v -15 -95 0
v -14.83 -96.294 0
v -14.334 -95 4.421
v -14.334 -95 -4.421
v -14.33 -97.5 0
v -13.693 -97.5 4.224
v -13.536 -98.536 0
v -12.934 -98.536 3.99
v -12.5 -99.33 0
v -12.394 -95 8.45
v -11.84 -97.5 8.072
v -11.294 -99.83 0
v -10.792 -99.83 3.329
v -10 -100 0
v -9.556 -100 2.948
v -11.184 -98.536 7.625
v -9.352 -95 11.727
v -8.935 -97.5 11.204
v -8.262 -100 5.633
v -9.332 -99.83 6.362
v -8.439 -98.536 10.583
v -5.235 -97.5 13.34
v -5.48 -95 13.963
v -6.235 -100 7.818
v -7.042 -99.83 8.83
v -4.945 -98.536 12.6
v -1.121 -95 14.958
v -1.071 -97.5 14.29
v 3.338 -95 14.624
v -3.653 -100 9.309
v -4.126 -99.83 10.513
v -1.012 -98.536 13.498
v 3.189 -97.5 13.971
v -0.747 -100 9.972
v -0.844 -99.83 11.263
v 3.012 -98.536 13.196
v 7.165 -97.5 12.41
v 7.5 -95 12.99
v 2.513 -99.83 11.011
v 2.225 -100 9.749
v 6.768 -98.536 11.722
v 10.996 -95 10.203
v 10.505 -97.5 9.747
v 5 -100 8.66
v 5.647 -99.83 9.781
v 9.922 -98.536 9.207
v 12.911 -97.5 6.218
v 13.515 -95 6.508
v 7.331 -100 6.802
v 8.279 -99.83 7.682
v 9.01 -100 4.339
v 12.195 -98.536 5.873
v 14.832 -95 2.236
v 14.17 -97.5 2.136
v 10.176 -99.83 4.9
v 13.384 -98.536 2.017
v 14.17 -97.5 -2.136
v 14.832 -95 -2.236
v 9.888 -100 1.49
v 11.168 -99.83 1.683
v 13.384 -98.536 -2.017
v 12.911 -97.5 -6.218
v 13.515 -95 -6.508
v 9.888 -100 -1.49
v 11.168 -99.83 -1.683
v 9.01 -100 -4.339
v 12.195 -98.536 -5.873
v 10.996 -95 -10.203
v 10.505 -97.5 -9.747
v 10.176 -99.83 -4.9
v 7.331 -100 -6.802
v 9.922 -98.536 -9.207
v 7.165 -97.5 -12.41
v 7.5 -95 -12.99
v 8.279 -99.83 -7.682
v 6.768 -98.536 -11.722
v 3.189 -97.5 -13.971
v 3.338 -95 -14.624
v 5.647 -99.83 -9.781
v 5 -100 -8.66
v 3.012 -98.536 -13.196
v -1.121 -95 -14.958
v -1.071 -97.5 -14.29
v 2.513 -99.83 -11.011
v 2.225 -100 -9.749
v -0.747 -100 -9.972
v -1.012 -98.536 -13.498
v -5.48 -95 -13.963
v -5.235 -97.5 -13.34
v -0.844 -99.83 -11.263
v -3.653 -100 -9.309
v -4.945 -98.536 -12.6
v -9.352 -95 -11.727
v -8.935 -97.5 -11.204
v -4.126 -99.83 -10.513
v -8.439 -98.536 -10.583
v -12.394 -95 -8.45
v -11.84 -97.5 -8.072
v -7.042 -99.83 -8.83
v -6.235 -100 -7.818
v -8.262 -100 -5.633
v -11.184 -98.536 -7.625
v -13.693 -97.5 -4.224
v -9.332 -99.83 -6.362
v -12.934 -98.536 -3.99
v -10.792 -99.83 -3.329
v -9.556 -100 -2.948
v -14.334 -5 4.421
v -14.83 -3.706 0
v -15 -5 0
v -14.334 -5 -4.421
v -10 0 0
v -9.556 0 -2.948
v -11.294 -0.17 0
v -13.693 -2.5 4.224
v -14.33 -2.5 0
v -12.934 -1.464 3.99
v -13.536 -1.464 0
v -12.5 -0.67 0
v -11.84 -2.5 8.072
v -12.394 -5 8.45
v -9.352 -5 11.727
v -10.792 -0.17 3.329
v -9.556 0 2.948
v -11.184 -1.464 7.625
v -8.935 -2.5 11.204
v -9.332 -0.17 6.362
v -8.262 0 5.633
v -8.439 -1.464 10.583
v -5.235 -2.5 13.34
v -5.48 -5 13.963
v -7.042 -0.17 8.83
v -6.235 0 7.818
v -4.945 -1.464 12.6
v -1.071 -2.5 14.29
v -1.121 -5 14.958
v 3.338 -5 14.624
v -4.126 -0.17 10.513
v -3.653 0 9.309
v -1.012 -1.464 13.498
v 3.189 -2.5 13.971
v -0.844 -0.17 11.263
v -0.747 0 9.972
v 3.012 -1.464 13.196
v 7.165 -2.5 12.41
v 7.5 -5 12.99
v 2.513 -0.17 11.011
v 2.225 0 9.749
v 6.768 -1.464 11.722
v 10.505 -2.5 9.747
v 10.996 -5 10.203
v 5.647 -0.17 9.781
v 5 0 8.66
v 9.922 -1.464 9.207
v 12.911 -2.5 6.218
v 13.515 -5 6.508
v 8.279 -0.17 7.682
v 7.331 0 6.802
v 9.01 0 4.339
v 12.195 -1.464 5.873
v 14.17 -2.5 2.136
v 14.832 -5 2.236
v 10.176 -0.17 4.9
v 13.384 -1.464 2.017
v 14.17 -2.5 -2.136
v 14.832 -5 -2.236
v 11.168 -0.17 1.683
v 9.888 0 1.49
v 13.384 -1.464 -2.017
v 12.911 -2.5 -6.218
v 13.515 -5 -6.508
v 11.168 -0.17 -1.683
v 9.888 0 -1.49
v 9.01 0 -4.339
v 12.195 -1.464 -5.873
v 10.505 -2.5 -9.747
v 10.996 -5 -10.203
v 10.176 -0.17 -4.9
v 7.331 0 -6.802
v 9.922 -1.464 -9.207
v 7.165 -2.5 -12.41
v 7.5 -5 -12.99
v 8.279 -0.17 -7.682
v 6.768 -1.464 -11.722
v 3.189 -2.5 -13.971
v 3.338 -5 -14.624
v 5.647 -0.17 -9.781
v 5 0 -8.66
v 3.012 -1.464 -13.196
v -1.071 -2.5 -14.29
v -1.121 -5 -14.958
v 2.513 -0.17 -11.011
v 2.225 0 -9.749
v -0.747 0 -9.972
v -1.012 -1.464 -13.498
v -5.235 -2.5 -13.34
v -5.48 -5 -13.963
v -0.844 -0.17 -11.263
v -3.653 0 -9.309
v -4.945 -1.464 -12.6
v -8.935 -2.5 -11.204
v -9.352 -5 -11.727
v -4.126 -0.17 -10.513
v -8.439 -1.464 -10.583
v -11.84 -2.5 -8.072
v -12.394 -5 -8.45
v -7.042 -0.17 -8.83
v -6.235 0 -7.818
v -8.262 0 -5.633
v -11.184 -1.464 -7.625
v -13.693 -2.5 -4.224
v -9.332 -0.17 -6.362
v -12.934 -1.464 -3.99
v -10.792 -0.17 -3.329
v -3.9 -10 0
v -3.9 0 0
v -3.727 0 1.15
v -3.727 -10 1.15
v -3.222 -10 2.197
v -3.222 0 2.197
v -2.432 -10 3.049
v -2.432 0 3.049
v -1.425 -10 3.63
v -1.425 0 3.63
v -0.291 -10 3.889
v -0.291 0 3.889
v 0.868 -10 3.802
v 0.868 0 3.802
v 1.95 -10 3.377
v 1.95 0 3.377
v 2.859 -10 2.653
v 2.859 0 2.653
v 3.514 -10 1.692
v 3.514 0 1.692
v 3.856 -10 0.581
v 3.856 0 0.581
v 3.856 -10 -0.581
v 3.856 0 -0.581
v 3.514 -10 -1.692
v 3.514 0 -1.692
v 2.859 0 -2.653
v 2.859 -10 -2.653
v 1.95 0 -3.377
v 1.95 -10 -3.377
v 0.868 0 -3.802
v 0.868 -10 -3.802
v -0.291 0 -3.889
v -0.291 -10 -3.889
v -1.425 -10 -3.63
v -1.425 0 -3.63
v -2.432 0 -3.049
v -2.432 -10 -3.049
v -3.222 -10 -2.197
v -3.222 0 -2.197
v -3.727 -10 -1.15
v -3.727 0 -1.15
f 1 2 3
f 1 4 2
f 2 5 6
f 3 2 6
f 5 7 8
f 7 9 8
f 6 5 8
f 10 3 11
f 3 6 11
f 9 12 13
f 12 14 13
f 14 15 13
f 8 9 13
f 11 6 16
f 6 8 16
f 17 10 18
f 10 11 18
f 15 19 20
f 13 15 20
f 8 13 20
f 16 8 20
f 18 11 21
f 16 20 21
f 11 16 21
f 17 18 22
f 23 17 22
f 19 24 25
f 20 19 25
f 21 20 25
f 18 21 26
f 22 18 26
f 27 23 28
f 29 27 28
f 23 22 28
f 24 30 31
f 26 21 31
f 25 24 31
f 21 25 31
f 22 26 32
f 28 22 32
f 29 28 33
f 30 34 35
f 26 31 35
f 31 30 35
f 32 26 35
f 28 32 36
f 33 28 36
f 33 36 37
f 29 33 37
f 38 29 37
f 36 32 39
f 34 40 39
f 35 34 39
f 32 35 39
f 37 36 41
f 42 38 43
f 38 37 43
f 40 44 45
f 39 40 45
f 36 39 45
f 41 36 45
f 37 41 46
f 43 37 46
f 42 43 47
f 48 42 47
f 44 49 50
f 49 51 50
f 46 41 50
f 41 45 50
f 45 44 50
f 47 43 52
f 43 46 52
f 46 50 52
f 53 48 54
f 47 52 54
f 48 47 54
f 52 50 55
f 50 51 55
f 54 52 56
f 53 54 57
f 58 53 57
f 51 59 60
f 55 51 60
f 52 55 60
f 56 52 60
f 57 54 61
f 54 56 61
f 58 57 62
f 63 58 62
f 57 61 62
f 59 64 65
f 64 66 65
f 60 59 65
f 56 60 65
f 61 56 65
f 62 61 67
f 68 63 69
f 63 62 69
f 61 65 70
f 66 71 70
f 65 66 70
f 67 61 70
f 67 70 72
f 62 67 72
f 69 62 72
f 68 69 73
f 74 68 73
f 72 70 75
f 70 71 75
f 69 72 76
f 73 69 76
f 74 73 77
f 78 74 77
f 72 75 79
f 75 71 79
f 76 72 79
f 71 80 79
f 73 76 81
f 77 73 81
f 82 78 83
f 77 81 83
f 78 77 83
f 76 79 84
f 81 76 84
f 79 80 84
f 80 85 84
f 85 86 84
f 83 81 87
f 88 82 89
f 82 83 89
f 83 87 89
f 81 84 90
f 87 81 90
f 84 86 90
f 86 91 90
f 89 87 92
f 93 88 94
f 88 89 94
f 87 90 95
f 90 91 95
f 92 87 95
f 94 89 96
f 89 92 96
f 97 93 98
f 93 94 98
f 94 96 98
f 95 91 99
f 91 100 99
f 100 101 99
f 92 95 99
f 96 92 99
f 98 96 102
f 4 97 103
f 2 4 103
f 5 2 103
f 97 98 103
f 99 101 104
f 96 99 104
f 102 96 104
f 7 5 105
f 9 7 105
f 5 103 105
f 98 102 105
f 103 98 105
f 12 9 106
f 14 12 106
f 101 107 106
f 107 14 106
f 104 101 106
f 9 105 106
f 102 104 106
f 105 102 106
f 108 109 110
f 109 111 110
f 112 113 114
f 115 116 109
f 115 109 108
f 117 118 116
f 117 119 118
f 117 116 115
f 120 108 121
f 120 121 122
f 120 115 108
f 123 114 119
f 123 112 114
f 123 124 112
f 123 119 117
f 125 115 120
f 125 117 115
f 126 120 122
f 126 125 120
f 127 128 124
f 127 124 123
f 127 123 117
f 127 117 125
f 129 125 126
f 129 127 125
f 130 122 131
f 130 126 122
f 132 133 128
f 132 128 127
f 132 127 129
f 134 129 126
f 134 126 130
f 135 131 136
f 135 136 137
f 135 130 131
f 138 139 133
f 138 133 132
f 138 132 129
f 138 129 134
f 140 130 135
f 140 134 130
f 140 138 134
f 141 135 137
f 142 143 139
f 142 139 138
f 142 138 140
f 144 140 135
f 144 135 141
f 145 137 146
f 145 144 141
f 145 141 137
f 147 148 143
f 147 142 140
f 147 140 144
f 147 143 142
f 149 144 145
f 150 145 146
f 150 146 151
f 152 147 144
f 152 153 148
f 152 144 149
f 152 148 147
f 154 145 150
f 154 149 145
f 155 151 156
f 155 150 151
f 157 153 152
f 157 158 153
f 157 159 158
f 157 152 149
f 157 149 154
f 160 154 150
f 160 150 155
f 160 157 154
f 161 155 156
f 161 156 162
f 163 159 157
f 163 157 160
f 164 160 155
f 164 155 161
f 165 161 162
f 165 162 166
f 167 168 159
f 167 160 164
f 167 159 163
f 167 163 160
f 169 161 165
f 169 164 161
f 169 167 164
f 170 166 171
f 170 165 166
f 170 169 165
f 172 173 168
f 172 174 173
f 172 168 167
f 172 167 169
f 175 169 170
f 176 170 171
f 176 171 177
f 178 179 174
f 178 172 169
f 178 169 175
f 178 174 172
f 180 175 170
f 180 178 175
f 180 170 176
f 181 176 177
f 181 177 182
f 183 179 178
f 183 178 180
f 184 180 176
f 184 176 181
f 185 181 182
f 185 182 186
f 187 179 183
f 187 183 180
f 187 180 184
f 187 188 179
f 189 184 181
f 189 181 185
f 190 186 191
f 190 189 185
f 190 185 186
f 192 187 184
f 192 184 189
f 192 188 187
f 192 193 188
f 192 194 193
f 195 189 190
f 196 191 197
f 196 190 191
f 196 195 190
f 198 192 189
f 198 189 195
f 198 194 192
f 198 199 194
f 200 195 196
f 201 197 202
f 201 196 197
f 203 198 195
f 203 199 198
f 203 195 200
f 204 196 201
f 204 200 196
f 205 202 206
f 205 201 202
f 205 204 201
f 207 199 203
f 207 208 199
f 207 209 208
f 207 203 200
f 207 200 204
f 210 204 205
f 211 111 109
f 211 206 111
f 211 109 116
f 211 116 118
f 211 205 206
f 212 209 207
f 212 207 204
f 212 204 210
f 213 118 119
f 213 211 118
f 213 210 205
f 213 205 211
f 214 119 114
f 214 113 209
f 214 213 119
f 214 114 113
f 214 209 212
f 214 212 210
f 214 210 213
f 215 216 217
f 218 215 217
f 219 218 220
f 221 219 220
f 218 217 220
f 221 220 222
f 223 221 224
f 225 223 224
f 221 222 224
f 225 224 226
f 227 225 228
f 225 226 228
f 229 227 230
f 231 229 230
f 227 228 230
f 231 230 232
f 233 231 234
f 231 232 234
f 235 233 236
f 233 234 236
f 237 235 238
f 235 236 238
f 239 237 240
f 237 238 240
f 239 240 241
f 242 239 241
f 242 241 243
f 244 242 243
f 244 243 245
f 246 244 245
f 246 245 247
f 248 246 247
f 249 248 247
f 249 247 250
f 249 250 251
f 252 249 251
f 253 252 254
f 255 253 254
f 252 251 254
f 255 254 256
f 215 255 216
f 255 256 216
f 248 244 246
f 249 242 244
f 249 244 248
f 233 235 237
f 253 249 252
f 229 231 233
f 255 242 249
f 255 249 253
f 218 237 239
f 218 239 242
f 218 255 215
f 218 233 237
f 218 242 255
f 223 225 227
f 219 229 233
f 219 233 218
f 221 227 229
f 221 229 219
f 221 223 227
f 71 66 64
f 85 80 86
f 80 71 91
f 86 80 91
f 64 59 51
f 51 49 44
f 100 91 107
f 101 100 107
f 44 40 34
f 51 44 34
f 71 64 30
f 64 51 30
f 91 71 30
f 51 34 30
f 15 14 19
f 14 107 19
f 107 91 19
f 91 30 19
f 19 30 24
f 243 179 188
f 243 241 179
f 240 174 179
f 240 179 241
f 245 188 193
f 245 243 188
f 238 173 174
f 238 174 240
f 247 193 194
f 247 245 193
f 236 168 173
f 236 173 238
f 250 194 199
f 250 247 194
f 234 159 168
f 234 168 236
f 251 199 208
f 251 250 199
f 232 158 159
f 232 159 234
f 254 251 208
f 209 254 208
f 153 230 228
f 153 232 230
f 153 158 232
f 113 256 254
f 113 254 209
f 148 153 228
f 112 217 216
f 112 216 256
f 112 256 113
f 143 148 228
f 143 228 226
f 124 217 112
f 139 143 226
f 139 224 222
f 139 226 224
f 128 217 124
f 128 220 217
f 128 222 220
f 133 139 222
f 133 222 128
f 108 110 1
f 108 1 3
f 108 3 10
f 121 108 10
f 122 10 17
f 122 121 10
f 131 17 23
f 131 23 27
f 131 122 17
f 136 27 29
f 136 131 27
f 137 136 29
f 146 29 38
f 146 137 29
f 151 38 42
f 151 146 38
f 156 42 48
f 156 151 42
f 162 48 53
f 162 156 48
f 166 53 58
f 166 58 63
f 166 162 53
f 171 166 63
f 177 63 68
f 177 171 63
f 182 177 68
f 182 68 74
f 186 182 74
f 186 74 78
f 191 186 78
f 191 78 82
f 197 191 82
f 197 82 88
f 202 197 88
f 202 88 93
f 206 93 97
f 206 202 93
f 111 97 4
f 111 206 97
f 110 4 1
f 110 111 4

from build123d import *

# Parameters (mm, degrees)
F0_W     = 15
F0_H     = 100
F2_R     = 3.9
F3_DEPTH = 10
F4_R     = 5


with BuildPart() as f1:
    # F0 (on Top) → F1 (revolve)
    with BuildSketch(Plane.XY):
        with Locations((-7.5, -50)):
            Rectangle(F0_W, F0_H)
    revolve(axis=Axis((0, -50, 0), (0, 1, 0)))

    # F2 (on face) → F3 (cut)
    with BuildSketch(Plane(origin=(0, 0, 0), x_dir=(-1, 0, 0), z_dir=(0, 1, 0))):
        Circle(F2_R)
    extrude(amount=-F3_DEPTH, mode=Mode.SUBTRACT)

    # F4
    f4_edges = [f1.edges().sort_by_distance(p)[0] for p in [
        (15, 0, 0),
        (15, -100, 0),
    ]]
    fillet(f4_edges, radius=F4_R)


solid = f1.part
